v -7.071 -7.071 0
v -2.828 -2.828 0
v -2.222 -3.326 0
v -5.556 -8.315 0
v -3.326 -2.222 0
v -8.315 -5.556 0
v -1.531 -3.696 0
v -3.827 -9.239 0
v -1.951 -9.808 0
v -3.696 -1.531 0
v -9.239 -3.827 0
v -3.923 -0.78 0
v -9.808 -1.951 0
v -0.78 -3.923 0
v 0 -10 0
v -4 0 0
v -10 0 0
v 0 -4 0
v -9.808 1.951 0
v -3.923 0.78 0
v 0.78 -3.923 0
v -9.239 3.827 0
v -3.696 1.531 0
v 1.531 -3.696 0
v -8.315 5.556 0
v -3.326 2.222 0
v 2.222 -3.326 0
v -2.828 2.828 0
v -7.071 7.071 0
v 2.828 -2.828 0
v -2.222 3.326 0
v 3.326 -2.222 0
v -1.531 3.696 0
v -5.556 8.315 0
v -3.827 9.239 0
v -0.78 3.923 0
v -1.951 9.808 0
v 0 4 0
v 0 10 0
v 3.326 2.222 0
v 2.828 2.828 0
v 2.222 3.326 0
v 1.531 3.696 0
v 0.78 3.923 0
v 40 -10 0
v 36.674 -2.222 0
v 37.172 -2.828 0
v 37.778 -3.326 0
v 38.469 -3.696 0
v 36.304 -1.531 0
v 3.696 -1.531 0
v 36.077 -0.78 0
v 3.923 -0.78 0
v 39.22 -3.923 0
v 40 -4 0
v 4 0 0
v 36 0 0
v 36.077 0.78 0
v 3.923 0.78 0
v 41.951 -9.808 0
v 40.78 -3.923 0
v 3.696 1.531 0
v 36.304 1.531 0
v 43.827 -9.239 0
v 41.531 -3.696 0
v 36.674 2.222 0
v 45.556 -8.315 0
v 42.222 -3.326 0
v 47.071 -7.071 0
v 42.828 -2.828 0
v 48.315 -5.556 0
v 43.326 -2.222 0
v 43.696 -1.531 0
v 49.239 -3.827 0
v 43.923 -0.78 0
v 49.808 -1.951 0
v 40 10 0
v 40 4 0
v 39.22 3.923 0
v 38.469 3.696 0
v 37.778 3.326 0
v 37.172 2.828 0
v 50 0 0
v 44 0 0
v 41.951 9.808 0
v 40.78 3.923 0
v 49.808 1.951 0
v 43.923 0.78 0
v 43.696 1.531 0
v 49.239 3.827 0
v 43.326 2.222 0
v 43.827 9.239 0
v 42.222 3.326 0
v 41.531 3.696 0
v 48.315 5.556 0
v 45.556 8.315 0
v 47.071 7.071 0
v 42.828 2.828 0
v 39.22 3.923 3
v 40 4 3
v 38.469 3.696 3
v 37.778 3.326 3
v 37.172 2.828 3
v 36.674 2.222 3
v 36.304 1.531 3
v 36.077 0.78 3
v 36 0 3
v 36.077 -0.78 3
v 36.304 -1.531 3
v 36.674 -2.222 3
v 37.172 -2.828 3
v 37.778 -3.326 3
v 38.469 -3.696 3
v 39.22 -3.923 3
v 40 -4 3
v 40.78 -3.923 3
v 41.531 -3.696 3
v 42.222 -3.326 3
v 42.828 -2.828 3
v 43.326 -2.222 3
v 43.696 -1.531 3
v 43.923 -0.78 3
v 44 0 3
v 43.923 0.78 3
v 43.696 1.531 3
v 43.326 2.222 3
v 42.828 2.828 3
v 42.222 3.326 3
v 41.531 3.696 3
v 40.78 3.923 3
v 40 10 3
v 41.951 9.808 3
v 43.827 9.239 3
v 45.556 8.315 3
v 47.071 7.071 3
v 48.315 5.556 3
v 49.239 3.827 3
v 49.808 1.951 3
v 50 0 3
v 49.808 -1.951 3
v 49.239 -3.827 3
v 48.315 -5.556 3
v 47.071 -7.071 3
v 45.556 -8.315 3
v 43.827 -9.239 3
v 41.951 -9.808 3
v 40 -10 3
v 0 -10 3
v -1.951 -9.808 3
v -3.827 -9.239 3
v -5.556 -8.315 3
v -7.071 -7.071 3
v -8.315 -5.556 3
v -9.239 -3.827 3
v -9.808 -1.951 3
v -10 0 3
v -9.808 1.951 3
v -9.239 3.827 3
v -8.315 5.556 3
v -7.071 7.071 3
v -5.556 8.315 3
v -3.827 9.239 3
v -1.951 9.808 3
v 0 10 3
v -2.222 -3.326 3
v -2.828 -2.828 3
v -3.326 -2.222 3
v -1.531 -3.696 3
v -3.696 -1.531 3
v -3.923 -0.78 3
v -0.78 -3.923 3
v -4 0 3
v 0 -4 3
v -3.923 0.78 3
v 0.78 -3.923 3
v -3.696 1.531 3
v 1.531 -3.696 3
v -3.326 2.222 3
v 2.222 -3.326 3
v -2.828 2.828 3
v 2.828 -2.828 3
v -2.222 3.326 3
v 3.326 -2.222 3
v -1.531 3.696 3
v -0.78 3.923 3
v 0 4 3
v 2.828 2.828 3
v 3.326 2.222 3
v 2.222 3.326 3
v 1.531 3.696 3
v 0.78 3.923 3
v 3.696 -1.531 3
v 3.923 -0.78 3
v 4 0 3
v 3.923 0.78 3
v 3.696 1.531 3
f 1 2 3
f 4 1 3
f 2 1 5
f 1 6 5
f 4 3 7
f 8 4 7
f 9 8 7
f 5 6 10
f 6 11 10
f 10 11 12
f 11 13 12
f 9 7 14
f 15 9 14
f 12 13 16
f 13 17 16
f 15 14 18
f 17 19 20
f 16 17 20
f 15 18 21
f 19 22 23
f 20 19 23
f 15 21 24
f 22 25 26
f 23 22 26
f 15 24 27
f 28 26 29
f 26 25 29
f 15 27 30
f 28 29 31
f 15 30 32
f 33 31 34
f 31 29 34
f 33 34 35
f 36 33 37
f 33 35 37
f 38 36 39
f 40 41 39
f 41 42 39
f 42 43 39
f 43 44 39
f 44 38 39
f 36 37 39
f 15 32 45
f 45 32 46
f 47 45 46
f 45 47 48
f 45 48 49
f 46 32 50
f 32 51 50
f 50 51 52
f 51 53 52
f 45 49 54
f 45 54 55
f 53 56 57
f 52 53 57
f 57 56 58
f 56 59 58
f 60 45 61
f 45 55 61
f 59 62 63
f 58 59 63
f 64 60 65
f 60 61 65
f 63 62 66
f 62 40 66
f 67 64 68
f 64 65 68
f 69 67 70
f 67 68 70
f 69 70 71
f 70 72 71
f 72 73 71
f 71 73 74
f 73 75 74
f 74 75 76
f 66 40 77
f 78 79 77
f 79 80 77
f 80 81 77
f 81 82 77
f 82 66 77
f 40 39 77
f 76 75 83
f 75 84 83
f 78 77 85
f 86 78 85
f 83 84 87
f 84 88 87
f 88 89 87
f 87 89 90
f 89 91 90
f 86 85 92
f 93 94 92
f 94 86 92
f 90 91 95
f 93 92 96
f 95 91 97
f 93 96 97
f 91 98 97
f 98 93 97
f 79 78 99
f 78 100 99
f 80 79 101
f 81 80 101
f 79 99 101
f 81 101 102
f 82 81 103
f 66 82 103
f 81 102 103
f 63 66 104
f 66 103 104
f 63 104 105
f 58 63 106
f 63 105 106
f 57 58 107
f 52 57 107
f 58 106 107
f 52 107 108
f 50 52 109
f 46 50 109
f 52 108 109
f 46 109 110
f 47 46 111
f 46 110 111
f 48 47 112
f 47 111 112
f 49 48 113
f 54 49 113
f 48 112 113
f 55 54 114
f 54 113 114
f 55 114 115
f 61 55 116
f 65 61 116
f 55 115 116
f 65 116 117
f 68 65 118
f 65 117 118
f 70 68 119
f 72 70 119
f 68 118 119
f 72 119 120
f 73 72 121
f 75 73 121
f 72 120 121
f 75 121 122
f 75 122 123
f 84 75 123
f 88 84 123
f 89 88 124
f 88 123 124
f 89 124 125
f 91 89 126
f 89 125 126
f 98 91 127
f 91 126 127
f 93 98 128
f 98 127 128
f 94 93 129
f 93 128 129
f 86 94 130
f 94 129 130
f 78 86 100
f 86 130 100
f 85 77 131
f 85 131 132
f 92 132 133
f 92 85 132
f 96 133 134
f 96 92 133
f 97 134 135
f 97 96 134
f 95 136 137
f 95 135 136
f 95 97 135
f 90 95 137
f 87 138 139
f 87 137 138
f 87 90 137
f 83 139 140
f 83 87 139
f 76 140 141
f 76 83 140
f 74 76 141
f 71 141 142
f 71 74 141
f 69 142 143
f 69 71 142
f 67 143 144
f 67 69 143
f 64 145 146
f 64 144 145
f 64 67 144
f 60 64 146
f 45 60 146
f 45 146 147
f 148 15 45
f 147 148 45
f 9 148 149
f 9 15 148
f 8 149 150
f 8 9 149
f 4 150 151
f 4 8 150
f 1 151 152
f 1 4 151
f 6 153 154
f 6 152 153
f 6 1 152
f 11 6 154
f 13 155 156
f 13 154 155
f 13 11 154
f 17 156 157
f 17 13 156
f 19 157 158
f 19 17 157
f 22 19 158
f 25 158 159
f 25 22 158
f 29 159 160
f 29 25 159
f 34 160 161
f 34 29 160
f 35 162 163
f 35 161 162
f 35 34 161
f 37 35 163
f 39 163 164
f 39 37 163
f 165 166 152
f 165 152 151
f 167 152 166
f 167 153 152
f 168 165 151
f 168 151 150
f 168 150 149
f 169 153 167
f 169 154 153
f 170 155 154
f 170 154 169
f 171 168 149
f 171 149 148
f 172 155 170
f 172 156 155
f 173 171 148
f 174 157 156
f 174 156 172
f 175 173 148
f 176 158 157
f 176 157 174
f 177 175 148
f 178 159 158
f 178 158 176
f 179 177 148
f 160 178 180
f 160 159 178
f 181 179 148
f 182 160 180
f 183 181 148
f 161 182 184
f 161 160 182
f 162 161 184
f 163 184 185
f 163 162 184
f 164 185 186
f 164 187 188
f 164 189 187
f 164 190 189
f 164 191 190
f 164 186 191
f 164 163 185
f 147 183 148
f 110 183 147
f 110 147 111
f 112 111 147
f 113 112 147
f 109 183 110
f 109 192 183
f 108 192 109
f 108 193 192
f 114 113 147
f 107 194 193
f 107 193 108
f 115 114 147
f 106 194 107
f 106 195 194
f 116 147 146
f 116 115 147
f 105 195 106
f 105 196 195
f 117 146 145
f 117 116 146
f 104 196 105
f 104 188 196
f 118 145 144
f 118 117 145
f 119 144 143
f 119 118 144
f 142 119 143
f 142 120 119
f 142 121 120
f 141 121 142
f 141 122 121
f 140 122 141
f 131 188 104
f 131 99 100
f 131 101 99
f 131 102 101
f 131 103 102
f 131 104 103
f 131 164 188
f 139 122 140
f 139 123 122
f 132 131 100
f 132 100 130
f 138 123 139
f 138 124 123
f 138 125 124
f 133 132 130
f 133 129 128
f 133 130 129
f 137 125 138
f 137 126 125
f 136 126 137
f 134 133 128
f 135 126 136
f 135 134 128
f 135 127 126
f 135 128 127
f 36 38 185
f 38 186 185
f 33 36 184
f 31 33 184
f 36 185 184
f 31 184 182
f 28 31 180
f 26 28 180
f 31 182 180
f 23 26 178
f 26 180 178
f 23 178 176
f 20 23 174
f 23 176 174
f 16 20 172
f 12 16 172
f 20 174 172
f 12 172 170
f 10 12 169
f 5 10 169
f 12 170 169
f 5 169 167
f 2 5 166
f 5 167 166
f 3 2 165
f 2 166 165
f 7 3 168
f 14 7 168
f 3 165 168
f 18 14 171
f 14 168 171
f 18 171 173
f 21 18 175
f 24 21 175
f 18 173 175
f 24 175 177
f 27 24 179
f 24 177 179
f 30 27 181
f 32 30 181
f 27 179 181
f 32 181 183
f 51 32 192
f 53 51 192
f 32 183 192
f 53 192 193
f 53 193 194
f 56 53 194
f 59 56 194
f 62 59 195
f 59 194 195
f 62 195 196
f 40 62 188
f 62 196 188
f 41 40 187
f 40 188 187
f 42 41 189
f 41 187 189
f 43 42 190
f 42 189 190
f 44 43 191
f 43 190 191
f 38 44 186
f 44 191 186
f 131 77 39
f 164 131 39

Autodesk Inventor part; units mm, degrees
ref_plane "YZ Plane" through (0, 0, 0) normal (1, 0, 0) x (0, 1, 0)
ref_plane "XZ Plane" through (0, 0, 0) normal (0, 1, 0) x (-1, 0, 0)
ref_plane "XY Plane" through (0, 0, 0) normal (0, 0, 1) x (1, 0, 0)
sketch "Szkic1" plane through (0, 0, 0) normal (0, 0, 1) x (1, 0, 0)
  line L0 (0, 0) -> (40, 0) construction
  line L1 (0, -10) -> (40, -10)
  line L2 (40, 10) -> (0, 10)
  arc A0 (0, 10) -> (0, -10) centre (0, 0) ccw
  arc A1 (40, -10) -> (40, 10) centre (40, 0) ccw
  point P0 (20, 0)
  dimension "d0" = 40
  dimension "d1" = 20
extrude "Wyciągnięcie proste1" add sketch "Szkic1" along normal blind 3
hole "Otwór1" at (0, 0, 0) at (40, 0, 0) direction (0, 0, 1) diameter 8 end through all
properties part number "ramie_2_wahacza"
